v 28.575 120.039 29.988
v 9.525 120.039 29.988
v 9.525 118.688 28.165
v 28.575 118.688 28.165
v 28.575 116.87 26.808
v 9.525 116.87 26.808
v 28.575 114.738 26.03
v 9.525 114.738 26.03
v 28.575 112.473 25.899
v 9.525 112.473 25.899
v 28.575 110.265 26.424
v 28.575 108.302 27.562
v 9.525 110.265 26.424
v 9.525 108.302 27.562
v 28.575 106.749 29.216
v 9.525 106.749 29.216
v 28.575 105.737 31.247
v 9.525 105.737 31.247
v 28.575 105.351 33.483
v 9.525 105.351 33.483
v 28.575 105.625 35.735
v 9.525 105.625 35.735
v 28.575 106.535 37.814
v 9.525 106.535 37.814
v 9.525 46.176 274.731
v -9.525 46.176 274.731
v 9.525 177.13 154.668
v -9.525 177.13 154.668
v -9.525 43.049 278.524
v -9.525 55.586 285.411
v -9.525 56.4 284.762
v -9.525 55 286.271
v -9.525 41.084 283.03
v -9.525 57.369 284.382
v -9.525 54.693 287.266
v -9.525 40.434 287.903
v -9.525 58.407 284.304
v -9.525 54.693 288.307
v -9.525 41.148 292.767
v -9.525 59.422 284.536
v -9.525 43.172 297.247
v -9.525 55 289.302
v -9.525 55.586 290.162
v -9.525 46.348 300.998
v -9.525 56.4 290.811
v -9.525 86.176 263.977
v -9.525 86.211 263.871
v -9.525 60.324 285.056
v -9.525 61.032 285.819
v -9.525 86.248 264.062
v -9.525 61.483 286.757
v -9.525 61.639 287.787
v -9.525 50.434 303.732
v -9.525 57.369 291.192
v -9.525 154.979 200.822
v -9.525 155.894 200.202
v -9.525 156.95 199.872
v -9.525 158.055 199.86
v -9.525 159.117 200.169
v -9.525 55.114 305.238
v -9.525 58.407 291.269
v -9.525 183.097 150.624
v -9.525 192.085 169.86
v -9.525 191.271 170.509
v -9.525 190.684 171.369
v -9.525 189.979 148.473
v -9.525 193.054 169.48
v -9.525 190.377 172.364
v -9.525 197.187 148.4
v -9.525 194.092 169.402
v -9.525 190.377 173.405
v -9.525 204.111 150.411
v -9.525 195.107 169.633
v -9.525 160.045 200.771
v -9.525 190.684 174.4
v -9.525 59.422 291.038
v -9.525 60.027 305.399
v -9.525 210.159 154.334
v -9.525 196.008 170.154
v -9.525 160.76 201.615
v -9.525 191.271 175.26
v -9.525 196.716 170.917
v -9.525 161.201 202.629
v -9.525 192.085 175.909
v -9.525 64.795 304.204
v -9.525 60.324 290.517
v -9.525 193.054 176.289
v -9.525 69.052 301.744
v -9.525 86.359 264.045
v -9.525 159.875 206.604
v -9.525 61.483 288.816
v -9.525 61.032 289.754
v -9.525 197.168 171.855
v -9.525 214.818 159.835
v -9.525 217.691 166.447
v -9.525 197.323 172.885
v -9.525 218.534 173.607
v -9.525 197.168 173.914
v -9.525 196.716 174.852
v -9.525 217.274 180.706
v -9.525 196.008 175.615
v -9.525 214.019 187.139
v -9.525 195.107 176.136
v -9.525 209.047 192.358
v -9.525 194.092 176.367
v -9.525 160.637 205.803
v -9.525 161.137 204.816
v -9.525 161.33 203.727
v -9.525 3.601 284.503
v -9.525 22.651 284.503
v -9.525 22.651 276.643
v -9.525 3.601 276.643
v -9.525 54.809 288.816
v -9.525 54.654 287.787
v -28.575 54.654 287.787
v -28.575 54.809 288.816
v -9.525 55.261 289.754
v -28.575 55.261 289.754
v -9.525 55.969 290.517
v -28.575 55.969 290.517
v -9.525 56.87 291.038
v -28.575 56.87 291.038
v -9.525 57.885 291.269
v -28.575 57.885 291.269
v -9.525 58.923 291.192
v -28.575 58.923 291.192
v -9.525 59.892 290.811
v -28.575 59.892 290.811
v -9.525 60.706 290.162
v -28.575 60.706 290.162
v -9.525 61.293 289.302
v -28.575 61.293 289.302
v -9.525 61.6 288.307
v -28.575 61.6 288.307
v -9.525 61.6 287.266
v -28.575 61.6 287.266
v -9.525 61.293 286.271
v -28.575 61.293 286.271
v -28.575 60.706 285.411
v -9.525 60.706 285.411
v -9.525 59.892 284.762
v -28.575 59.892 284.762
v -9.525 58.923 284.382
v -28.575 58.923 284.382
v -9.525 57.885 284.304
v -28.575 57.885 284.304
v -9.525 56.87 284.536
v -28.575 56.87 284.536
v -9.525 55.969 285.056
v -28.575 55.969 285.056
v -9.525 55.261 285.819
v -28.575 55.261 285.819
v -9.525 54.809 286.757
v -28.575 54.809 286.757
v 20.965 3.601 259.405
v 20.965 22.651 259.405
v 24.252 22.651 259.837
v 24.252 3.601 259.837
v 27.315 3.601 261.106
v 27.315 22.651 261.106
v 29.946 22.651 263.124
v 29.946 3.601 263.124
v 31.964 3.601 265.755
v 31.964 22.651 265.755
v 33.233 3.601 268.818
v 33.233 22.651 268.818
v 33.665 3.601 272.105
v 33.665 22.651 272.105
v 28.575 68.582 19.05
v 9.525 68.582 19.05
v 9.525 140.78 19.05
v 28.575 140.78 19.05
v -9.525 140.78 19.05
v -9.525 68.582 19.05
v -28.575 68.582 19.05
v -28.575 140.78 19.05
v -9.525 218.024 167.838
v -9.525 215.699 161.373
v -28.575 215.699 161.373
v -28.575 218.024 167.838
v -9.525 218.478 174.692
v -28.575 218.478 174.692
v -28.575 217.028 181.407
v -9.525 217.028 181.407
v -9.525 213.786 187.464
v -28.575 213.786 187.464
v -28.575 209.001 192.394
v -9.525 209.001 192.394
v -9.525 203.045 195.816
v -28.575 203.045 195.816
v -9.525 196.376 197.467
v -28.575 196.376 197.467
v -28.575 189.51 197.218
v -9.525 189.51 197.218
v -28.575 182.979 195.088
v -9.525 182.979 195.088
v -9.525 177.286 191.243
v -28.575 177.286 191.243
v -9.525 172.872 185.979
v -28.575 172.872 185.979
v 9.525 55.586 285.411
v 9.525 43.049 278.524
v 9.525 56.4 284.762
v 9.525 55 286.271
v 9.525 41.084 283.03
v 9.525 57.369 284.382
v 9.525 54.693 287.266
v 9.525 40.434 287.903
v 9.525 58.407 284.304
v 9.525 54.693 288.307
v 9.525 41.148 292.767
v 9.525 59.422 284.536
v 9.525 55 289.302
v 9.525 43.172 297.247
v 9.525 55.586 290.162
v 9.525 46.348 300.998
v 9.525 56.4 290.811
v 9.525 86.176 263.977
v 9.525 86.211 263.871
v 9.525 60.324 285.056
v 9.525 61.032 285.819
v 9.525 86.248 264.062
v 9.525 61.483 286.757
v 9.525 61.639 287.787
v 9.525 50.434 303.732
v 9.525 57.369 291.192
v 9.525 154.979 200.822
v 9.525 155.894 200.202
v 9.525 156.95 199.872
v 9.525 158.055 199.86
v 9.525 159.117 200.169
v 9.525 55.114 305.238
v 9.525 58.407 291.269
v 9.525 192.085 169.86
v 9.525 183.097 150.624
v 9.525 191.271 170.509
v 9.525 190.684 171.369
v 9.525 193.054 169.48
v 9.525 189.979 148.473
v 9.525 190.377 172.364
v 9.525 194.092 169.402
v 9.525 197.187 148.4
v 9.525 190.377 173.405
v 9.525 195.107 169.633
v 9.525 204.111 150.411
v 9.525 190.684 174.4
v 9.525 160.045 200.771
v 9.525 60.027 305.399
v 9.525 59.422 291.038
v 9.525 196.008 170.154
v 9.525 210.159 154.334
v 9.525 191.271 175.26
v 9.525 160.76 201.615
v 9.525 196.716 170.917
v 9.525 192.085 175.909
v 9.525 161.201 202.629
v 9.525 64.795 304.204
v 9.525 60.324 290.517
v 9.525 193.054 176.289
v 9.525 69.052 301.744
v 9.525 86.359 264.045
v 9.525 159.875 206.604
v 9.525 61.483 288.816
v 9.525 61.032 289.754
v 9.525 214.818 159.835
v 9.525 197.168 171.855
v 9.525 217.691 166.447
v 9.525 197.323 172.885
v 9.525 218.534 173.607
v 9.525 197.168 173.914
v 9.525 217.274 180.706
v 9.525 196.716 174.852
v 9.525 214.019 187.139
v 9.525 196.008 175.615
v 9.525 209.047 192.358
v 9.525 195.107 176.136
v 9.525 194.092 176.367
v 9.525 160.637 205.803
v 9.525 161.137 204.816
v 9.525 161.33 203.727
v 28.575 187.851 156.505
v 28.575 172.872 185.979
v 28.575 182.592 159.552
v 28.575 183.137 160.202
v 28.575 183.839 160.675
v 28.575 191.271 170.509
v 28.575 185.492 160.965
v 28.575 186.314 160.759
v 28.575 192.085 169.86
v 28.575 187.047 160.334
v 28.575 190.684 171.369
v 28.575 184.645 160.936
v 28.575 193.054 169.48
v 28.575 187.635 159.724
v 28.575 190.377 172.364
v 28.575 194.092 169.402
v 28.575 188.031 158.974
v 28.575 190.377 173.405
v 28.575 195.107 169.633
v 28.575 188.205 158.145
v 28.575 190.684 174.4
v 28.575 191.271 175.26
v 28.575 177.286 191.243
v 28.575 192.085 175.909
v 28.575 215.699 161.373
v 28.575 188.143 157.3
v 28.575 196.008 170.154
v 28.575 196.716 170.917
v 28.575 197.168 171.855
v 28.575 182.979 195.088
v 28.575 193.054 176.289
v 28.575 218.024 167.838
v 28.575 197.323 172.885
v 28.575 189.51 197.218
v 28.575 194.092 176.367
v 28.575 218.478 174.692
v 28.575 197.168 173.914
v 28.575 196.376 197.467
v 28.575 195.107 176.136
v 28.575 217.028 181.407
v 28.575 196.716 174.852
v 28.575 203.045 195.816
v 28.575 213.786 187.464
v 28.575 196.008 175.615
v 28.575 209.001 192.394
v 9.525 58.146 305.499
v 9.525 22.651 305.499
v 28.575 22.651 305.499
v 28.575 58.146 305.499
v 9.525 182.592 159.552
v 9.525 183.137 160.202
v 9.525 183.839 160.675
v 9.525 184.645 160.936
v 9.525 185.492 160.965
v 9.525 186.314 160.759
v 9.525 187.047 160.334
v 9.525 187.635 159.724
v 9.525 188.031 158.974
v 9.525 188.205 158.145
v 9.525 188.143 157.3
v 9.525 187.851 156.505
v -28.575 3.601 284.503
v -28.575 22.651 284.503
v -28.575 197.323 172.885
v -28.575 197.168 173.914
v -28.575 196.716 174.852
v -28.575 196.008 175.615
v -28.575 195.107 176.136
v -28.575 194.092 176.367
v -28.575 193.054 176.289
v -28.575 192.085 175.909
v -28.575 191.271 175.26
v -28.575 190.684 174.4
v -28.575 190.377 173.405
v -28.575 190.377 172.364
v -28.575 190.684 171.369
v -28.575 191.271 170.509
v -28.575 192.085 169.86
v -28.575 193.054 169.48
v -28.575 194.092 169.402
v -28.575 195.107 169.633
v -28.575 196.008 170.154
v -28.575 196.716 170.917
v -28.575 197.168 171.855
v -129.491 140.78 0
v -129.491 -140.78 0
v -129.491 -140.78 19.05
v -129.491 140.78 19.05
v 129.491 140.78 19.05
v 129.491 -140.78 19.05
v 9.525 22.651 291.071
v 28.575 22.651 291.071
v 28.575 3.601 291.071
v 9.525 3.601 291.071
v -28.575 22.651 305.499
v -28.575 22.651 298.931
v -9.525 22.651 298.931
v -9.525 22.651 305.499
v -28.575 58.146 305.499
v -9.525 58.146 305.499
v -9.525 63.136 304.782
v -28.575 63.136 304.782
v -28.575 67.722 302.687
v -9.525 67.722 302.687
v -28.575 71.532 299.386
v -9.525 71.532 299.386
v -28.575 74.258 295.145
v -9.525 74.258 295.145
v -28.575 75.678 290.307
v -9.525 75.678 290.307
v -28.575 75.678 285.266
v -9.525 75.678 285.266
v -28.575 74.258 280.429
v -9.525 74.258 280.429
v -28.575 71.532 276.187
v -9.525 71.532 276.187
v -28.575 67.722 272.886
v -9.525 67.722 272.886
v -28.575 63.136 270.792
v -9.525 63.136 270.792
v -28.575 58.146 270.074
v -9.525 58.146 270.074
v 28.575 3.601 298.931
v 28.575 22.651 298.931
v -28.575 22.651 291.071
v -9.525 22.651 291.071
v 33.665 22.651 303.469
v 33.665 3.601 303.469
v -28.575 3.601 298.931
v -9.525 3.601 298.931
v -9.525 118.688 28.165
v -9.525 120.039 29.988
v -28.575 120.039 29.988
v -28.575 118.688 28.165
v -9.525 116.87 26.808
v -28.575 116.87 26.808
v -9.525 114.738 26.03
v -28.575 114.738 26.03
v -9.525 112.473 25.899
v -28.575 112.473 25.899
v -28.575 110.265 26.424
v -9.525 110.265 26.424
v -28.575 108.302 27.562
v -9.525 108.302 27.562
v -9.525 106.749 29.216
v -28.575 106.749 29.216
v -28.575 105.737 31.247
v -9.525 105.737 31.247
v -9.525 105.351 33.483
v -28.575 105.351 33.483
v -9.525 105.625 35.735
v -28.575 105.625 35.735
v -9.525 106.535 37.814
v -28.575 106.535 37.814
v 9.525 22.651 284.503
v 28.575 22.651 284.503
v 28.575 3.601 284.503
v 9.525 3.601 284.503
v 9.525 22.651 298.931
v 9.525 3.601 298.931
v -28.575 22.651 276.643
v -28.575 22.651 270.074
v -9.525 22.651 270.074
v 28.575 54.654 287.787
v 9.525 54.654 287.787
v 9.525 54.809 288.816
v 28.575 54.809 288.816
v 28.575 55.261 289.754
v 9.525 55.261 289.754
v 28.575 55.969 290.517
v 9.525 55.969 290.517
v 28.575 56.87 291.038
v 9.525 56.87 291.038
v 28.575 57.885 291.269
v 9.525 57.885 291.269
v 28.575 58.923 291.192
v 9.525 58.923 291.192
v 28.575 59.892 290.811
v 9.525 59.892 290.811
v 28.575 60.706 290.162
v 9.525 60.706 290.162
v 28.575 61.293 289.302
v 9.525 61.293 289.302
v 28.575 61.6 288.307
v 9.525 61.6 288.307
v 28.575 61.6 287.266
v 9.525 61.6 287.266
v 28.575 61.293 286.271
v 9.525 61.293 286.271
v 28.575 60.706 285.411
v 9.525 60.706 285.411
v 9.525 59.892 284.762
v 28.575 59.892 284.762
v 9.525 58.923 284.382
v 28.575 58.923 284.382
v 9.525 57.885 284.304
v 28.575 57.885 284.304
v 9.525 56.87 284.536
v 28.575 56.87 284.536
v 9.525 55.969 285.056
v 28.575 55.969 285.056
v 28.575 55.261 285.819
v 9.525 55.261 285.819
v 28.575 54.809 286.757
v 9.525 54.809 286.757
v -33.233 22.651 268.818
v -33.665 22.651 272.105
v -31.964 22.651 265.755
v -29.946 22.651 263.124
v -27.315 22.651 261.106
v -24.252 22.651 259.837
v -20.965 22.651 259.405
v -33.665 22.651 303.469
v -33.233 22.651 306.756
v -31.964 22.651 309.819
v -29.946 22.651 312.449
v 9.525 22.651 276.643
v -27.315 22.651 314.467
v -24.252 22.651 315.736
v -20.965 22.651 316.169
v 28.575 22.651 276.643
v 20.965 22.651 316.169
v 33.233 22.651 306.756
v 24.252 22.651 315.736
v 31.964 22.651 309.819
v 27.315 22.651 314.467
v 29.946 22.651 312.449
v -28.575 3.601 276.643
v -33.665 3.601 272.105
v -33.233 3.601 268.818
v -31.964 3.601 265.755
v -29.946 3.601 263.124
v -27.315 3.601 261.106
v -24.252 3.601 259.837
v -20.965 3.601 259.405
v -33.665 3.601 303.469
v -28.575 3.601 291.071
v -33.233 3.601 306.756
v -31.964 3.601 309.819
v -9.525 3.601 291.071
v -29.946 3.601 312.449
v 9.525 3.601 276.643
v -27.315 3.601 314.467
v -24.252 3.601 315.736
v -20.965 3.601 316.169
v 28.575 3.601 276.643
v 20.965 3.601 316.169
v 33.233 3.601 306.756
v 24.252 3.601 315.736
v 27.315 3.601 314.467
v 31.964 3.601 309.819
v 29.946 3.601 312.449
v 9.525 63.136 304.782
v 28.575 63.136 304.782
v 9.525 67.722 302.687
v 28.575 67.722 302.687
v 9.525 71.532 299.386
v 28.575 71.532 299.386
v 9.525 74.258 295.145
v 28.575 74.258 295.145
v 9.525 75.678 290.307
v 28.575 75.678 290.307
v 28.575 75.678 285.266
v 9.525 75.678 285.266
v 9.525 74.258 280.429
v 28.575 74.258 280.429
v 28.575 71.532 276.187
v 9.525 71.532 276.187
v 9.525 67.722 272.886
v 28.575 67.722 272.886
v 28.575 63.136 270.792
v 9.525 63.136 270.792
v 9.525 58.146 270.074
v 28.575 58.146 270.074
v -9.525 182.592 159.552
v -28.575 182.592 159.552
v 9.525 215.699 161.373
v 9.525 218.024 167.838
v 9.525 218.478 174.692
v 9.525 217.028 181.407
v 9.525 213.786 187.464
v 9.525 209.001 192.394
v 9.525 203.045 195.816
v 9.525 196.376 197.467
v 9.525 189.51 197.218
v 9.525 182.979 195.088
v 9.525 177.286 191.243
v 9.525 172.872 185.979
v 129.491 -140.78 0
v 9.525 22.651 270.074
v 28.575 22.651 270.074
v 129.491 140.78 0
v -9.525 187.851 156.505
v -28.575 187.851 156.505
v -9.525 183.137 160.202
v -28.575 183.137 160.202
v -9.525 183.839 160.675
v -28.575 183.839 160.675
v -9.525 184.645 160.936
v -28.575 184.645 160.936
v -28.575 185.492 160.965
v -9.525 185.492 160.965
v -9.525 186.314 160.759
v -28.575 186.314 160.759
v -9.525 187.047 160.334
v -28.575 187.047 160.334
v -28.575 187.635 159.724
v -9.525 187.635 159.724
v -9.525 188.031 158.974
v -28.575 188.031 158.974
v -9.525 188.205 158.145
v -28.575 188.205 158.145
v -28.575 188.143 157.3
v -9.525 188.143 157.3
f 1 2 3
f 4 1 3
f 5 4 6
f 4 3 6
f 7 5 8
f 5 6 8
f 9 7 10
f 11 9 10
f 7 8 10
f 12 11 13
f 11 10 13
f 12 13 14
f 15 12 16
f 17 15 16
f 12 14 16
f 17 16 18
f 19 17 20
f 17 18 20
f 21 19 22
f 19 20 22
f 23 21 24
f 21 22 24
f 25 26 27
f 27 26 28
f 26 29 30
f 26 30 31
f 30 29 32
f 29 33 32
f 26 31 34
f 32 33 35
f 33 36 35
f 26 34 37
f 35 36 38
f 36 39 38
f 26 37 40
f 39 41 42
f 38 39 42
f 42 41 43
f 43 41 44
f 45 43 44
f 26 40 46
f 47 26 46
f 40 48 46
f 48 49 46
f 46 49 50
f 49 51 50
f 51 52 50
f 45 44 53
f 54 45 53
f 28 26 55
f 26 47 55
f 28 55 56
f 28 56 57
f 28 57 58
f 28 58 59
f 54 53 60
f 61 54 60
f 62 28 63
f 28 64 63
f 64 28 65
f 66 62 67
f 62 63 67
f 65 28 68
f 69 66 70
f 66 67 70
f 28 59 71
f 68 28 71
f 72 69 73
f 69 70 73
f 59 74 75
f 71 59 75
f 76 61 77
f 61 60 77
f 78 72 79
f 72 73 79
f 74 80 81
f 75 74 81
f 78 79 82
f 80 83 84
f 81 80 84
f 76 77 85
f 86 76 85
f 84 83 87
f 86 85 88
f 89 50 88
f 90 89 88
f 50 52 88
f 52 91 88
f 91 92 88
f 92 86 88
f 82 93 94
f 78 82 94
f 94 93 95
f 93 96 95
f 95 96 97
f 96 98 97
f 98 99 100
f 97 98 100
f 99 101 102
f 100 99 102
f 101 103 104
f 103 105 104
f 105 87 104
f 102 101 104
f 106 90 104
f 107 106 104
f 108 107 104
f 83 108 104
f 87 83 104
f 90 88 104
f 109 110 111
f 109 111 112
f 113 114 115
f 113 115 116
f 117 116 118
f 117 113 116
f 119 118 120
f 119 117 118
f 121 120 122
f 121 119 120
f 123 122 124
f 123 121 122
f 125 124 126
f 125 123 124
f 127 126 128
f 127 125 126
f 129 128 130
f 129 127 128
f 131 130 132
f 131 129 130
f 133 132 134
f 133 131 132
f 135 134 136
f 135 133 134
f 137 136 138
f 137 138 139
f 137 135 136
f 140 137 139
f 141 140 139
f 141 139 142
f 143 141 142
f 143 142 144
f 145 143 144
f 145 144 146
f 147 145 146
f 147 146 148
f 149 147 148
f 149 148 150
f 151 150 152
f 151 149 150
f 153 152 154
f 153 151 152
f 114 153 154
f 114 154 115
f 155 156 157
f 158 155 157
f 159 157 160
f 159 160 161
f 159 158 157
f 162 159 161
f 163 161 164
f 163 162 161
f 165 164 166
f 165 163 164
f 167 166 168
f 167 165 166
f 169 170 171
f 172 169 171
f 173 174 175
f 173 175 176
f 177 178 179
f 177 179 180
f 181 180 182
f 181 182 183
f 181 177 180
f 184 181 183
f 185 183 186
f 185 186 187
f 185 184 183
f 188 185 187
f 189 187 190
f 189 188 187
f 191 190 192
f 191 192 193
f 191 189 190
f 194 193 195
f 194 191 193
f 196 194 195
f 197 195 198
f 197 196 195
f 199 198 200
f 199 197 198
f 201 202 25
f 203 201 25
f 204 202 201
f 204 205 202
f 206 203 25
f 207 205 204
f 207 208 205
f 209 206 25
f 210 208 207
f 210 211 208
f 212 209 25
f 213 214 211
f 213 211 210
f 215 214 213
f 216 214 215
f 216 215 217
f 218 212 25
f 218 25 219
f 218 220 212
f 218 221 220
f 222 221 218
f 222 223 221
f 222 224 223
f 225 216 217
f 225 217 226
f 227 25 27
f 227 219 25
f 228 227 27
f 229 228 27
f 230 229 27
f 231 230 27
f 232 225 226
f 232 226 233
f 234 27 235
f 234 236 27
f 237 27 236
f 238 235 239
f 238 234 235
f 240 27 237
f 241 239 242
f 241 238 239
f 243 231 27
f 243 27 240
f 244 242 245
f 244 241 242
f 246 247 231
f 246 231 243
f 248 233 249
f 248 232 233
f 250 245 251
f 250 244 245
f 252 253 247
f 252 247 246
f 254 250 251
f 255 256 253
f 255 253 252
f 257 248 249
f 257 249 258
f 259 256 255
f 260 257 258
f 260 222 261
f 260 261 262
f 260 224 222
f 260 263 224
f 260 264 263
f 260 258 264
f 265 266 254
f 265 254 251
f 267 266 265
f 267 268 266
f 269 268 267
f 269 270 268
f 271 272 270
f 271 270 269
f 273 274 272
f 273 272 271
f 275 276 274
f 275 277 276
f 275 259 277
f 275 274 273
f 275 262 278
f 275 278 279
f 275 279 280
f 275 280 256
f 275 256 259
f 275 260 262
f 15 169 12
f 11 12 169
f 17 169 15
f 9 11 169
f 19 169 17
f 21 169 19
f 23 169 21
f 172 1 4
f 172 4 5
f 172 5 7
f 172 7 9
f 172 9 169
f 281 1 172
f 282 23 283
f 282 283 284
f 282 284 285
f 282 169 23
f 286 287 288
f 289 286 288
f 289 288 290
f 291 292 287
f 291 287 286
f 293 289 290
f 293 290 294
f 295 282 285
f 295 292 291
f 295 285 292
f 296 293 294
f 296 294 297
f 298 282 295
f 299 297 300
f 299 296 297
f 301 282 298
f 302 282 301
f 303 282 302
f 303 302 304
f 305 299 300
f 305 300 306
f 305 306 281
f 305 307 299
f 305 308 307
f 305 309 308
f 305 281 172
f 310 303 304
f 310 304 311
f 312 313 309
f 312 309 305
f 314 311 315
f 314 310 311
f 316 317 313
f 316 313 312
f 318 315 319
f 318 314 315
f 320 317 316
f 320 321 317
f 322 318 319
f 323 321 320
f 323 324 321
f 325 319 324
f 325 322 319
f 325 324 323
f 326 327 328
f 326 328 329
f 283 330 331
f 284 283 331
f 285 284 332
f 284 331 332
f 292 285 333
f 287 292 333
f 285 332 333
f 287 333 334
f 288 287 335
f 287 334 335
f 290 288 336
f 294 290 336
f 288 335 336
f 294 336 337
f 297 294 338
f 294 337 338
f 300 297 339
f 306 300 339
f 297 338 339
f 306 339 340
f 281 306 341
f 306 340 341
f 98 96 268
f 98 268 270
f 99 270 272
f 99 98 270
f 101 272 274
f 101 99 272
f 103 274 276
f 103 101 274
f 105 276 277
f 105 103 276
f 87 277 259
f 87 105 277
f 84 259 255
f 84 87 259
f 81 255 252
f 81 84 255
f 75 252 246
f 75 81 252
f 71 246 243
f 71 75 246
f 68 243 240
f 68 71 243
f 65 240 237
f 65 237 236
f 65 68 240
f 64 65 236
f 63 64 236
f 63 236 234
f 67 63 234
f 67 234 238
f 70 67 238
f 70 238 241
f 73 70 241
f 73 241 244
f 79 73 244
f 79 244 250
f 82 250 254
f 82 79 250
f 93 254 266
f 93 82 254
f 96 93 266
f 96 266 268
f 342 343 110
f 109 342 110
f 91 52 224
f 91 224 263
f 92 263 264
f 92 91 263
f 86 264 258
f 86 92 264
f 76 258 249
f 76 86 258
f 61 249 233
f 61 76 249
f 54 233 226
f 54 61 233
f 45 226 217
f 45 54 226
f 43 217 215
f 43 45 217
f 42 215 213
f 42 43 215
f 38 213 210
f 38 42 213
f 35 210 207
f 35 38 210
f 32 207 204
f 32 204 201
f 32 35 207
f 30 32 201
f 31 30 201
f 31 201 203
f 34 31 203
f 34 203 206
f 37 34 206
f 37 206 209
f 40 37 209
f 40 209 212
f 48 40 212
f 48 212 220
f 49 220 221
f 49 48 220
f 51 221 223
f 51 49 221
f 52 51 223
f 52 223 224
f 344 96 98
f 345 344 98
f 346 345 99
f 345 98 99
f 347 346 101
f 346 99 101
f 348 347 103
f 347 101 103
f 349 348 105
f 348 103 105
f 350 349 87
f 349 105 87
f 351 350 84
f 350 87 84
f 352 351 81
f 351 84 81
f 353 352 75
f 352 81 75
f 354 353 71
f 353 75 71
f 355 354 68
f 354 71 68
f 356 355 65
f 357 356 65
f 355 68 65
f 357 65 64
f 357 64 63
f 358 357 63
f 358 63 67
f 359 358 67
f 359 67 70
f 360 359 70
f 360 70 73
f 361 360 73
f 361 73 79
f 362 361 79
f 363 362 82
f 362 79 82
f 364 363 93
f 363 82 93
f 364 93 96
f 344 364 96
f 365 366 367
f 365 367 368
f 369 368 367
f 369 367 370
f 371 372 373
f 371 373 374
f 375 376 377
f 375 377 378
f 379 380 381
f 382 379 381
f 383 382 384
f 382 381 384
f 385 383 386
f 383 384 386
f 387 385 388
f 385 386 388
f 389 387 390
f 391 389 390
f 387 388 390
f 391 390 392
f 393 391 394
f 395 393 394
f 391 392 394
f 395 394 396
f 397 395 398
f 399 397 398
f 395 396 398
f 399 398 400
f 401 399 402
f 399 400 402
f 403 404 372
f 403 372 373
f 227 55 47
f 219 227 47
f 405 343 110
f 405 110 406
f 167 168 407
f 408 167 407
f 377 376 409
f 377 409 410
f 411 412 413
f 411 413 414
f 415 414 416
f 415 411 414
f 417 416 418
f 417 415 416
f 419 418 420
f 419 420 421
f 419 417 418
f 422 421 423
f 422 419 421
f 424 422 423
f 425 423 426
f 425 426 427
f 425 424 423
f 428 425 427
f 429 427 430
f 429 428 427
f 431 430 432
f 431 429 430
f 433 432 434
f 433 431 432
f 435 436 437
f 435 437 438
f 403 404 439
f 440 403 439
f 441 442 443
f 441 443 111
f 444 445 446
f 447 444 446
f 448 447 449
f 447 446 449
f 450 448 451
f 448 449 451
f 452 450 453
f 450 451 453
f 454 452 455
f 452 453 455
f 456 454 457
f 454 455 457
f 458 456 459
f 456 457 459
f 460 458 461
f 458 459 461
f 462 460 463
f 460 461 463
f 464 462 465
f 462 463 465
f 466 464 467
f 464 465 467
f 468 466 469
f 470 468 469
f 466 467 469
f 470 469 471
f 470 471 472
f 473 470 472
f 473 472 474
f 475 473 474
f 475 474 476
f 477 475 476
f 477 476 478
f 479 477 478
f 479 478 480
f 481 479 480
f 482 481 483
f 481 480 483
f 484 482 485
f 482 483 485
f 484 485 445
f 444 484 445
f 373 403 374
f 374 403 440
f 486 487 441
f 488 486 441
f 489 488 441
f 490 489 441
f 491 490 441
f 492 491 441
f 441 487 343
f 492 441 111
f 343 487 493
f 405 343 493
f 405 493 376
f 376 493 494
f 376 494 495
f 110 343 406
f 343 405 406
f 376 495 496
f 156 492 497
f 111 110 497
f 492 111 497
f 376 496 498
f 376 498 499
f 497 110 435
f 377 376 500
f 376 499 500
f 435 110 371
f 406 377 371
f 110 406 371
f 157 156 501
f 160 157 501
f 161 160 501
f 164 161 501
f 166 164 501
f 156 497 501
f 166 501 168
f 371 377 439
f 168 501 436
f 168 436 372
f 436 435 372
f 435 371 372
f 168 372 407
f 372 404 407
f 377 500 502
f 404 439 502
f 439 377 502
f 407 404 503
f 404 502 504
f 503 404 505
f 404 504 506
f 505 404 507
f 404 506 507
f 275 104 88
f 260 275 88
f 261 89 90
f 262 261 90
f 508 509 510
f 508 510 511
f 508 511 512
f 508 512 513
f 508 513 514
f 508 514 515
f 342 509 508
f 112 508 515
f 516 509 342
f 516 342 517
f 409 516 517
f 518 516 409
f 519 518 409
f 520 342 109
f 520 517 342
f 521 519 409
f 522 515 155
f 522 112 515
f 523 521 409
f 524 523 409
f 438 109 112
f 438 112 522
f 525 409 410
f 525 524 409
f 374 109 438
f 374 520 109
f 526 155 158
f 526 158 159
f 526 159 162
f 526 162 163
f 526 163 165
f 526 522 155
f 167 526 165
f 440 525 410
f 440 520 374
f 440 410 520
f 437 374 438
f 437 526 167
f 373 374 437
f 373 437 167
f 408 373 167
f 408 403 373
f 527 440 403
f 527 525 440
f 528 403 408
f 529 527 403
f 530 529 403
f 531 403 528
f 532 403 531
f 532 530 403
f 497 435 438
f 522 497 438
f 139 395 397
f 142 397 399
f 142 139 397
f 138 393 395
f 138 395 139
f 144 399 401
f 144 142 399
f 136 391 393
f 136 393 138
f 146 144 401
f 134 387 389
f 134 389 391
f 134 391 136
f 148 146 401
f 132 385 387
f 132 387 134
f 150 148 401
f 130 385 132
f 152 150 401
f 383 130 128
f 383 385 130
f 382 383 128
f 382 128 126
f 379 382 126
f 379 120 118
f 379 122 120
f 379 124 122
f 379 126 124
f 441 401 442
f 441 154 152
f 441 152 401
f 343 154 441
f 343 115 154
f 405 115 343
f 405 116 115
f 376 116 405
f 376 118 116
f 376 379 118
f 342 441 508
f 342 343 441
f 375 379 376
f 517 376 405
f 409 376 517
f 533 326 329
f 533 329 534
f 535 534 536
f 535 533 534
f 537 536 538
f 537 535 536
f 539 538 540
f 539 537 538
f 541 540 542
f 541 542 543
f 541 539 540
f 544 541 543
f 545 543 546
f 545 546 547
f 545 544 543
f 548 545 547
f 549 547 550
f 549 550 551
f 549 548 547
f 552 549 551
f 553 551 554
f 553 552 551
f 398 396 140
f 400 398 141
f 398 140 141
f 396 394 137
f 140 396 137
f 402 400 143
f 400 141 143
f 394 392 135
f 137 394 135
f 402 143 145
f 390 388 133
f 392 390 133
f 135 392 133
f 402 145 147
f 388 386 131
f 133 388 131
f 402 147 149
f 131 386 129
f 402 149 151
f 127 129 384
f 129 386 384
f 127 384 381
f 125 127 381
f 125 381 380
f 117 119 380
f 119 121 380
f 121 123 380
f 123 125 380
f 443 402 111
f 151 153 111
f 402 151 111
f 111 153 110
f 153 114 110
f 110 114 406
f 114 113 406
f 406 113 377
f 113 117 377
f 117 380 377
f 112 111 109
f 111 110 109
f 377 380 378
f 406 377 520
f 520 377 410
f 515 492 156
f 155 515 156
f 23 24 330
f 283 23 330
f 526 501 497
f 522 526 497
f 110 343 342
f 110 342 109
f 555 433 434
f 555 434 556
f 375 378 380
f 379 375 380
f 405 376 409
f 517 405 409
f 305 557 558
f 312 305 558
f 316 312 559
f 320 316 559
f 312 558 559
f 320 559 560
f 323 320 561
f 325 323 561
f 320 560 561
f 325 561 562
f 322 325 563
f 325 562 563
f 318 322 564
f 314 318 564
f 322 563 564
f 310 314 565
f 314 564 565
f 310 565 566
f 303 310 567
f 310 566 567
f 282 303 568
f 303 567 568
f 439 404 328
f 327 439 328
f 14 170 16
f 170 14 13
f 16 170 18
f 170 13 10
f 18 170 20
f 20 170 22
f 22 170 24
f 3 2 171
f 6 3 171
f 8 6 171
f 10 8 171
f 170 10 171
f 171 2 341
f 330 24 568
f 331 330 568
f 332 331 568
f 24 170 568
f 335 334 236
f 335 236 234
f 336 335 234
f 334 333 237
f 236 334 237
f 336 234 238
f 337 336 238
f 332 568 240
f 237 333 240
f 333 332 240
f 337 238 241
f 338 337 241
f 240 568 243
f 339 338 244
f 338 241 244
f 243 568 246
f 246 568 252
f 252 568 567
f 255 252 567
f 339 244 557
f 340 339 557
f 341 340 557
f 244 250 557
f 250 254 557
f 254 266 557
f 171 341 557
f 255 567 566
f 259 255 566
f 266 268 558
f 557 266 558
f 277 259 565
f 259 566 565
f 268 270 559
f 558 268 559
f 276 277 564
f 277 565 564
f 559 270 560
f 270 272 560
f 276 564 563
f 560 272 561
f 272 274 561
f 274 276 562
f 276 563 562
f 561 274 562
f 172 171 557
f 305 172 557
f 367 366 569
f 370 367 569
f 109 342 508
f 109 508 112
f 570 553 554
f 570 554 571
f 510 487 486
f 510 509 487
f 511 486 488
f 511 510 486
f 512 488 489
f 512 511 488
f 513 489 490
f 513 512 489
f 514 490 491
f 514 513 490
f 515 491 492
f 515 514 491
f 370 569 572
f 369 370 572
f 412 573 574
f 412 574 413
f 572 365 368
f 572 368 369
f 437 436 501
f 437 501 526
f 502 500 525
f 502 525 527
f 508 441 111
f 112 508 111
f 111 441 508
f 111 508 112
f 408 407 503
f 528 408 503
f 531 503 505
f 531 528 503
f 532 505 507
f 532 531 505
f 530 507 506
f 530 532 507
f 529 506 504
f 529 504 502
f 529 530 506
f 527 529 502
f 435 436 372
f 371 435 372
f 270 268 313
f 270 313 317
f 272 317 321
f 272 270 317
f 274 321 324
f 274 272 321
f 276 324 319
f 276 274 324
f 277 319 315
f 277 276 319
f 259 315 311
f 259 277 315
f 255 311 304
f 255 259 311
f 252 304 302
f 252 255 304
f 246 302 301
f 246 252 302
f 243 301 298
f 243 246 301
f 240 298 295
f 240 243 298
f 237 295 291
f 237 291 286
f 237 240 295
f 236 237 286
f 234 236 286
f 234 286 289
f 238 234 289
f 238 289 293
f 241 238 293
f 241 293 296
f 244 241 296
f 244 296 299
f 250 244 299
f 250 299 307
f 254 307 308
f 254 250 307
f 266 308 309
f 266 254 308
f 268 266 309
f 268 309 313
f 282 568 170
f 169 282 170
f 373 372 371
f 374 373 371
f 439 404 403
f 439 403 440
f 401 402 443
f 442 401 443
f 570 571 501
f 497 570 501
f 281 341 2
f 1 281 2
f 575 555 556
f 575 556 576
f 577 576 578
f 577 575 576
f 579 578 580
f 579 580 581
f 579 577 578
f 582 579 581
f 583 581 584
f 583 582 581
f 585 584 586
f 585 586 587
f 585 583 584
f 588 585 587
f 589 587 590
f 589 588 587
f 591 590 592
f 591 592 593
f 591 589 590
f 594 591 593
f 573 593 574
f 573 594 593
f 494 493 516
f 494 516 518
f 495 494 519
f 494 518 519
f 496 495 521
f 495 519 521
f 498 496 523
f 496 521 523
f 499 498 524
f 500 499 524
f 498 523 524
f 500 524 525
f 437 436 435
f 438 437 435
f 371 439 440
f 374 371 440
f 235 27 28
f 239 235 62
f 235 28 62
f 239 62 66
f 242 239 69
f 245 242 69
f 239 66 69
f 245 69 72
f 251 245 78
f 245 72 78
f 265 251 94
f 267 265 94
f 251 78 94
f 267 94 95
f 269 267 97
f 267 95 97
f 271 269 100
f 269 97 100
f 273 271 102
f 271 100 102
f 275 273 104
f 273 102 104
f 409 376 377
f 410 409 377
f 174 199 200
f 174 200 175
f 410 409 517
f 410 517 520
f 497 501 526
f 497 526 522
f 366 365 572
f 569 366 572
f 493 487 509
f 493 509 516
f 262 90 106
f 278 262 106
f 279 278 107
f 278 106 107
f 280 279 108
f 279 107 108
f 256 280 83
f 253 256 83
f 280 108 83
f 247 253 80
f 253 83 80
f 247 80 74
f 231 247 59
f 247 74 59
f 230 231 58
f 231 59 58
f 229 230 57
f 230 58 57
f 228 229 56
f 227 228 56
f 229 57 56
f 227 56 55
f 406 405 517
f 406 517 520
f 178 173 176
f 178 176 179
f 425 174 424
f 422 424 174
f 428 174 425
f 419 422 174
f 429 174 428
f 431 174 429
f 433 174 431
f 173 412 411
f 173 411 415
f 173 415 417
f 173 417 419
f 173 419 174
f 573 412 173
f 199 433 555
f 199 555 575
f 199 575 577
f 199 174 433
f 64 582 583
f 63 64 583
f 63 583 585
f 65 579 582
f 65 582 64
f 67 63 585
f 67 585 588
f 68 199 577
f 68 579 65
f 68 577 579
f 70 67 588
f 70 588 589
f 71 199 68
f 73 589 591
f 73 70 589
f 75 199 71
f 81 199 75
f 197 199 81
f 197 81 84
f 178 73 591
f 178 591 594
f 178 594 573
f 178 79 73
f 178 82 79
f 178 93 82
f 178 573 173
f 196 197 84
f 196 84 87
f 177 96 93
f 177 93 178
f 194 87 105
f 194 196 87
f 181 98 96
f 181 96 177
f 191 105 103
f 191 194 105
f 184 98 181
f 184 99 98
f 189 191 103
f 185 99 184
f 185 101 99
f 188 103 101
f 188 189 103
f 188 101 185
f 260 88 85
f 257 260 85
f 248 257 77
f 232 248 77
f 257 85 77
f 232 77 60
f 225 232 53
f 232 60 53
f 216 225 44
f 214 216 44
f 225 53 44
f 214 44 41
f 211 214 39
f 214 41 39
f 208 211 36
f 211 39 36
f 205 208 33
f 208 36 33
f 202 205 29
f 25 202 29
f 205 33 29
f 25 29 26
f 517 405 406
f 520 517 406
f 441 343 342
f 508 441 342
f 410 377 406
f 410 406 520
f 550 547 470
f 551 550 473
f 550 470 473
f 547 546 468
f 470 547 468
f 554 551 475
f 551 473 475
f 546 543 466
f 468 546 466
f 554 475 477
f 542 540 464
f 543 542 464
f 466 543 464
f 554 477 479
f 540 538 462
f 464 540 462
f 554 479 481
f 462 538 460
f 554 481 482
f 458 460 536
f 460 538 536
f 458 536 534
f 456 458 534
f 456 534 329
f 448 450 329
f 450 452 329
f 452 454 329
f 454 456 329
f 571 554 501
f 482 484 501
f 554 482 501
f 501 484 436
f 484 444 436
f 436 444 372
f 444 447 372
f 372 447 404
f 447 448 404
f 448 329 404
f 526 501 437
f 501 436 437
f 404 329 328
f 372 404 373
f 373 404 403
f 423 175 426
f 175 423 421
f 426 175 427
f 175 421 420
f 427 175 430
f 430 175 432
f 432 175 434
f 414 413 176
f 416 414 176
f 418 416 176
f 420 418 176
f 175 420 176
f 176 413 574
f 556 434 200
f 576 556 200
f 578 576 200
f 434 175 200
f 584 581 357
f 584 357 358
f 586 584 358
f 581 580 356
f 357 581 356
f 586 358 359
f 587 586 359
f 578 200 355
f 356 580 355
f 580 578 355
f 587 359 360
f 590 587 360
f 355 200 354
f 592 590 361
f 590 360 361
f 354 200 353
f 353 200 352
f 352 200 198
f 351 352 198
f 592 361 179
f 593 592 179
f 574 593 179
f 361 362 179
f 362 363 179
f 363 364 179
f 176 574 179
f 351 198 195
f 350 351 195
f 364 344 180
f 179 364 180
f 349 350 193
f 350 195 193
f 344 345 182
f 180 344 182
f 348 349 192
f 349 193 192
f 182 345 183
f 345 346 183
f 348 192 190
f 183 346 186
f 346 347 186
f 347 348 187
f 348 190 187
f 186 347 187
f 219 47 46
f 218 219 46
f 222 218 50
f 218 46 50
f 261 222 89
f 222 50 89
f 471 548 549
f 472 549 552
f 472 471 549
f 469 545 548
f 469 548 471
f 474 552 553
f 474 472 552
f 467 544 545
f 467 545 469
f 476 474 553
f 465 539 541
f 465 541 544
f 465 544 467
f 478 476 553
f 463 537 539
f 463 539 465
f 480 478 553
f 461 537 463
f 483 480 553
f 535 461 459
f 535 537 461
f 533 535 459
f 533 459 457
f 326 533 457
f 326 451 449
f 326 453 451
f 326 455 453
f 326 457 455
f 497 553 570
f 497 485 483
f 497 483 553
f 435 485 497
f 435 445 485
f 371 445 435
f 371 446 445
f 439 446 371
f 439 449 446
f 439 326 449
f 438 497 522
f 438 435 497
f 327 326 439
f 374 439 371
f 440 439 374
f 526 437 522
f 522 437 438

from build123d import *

# Parameters (mm, degrees)
F1_W      = 258.9819133282
F1_H      = 281.5590798855
F2_DEPTH  = 19.05
F4_R      = 3.4925
F5_DEPTH  = 19.05
F7_R      = 3.4925
F8_DEPTH  = 19.05
F9_R      = 3.4925
F10_DEPTH = 19.05
F11_W     = 19.05
F11_H     = 7.8599496324
F12_DEPTH = 19.05
F14_W     = 67.3306509852
F14_H     = 56.7641787347
F15_DEPTH = 19.05
F16_R     = 12.7


# Not quite as in the source:
# - a length typed as a fraction of an inch, garbled in the dataset ("3 / 203.2 mm" for 3/8 in), is restored


with BuildPart() as f2:
    # F1 (on Top) → F2 (new body)
    with BuildSketch(Plane.XY):
        Rectangle(F1_W, F1_H)
    extrude(amount=F2_DEPTH)


with BuildPart() as f5:
    # F4 (on offset) → F5 (new body)
    with BuildSketch(Plane.YZ.offset(9.525)):
        with BuildLine():
            Line((172.8715040576, 185.9790129475), (68.581538884, 19.05))
            Line((68.581538884, 19.05), (140.7795399427, 19.05))
            Line((140.7795399427, 19.05), (215.6994648239, 161.3726968817))
            ThreePointArc((215.6994648239, 161.3726968817), (206.1423956156, 194.3131305331), (172.8715040576, 185.9790129475))
        make_face()
        with BuildLine():
            Line((106.5350997704, 37.813880341), (182.5920726412, 159.5524904553))
            ThreePointArc((182.5920726412, 159.5524904553), (186.6956178335, 160.572252657), (187.8510267574, 156.5048175547))
            Line((187.8510267574, 156.5048175547), (120.0389151124, 29.9881394879))
            ThreePointArc((120.0389151124, 29.9881394879), (109.2420284863, 26.9211405451), (106.5350997704, 37.813880341))
        make_face(mode=Mode.SUBTRACT)
        with Locations((193.8308401065, 172.8845341148)):
            Circle(F4_R, mode=Mode.SUBTRACT)
    extrude(amount=F5_DEPTH)


with BuildPart() as f6_1:
    # F6: instance of F5
    add(f5.part.mirror(Plane.YZ))


with BuildPart() as f8:
    # F7 (on face) → F8 (new body)
    with BuildSketch(Plane.YZ.offset(-9.525)):
        with BuildLine():
            Line((46.176193297, 274.7309380486), (177.1296344703, 154.6683634467))
            ThreePointArc((177.1296344703, 154.6683634467), (212.6905081368, 156.9135583995), (209.0468139458, 192.3584470147))
            Line((209.0468139458, 192.3584470147), (69.05164406, 301.7439030123))
            ThreePointArc((69.05164406, 301.7439030123), (44.6291956916, 299.2333031282), (46.176193297, 274.7309380486))
        make_face()
        with Locations((193.8308401065, 172.8845341148)):
            Circle(F7_R, mode=Mode.SUBTRACT)
        with BuildLine():
            ThreePointArc((86.2107777334, 263.8706501543), (86.2007704818, 264.0291515835), (86.3587549441, 264.0453922064))
            Line((86.3587549441, 264.0453922064), (159.8745879565, 206.6036752981))
            ThreePointArc((159.8745879565, 206.6036752981), (160.4335278853, 201.1664562348), (154.9785168029, 200.8220450298))
            Line((154.9785168029, 200.8220450298), (86.2107777334, 263.8706501543))
        make_face(mode=Mode.SUBTRACT)
        with Locations((58.1461609912, 287.7867005582)):
            Circle(F7_R, mode=Mode.SUBTRACT)
    extrude(amount=F8_DEPTH)


with BuildPart() as f10:
    # F9 (on face) → F10 (new body)
    with BuildSketch(Plane(origin=(-9.525, 0, 0), x_dir=(0, -1, 0), z_dir=(-1, 0, 0))):
        with BuildLine():
            Line((-22.6510197505, 305.4992119924), (-58.1461609912, 305.4992119924))
            ThreePointArc((-58.1461609912, 305.4992119924), (-75.8586724255, 287.7867005582), (-58.1461609912, 270.074189124))
            Line((-58.1461609912, 270.074189124), (-22.6510197505, 270.074189124))
            Line((-22.6510197505, 270.074189124), (-22.6510197505, 305.4992119924))
        make_face()
        with Locations((-58.1461609912, 287.7867005582)):
            Circle(F9_R, mode=Mode.SUBTRACT)
    extrude(amount=F10_DEPTH)

    # F11 (on face) → F12 (join)
    with BuildSketch(Plane.XZ.offset(-22.6510197505)):
        with Locations((-19.05, 295.0008626417)):
            Rectangle(F11_W, F11_H)
        with Locations((-19.05, 280.5725384747)):
            Rectangle(F11_W, F11_H)
    extrude(amount=F12_DEPTH)


with BuildPart() as f13_1:
    # F13: instance of F10
    add(f10.part.mirror(Plane.YZ))


with BuildPart() as f15:
    # F14 (on face) → F15 (new body)
    with BuildSketch(Plane.XZ.offset(-22.6510197505)):
        with Locations((0, 287.7867005582)):
            Rectangle(F14_W, F14_H)
    extrude(amount=F15_DEPTH)

    # F16
    f16_edges = [f15.edges().sort_by_distance(p)[0] for p in [
        (-33.665325, 13.12602, 316.16879),
        (33.665325, 13.12602, 316.16879),
        (33.665325, 13.12602, 259.404611),
        (-33.665325, 13.12602, 259.404611),
    ]]
    fillet(f16_edges, radius=F16_R)

    # F17: cut F10, F13_1
    add(f10.part, mode=Mode.SUBTRACT)
    add(f13_1.part, mode=Mode.SUBTRACT)


solid = Compound([f2.part, f5.part, f6_1.part, f8.part, f10.part, f13_1.part, f15.part])
